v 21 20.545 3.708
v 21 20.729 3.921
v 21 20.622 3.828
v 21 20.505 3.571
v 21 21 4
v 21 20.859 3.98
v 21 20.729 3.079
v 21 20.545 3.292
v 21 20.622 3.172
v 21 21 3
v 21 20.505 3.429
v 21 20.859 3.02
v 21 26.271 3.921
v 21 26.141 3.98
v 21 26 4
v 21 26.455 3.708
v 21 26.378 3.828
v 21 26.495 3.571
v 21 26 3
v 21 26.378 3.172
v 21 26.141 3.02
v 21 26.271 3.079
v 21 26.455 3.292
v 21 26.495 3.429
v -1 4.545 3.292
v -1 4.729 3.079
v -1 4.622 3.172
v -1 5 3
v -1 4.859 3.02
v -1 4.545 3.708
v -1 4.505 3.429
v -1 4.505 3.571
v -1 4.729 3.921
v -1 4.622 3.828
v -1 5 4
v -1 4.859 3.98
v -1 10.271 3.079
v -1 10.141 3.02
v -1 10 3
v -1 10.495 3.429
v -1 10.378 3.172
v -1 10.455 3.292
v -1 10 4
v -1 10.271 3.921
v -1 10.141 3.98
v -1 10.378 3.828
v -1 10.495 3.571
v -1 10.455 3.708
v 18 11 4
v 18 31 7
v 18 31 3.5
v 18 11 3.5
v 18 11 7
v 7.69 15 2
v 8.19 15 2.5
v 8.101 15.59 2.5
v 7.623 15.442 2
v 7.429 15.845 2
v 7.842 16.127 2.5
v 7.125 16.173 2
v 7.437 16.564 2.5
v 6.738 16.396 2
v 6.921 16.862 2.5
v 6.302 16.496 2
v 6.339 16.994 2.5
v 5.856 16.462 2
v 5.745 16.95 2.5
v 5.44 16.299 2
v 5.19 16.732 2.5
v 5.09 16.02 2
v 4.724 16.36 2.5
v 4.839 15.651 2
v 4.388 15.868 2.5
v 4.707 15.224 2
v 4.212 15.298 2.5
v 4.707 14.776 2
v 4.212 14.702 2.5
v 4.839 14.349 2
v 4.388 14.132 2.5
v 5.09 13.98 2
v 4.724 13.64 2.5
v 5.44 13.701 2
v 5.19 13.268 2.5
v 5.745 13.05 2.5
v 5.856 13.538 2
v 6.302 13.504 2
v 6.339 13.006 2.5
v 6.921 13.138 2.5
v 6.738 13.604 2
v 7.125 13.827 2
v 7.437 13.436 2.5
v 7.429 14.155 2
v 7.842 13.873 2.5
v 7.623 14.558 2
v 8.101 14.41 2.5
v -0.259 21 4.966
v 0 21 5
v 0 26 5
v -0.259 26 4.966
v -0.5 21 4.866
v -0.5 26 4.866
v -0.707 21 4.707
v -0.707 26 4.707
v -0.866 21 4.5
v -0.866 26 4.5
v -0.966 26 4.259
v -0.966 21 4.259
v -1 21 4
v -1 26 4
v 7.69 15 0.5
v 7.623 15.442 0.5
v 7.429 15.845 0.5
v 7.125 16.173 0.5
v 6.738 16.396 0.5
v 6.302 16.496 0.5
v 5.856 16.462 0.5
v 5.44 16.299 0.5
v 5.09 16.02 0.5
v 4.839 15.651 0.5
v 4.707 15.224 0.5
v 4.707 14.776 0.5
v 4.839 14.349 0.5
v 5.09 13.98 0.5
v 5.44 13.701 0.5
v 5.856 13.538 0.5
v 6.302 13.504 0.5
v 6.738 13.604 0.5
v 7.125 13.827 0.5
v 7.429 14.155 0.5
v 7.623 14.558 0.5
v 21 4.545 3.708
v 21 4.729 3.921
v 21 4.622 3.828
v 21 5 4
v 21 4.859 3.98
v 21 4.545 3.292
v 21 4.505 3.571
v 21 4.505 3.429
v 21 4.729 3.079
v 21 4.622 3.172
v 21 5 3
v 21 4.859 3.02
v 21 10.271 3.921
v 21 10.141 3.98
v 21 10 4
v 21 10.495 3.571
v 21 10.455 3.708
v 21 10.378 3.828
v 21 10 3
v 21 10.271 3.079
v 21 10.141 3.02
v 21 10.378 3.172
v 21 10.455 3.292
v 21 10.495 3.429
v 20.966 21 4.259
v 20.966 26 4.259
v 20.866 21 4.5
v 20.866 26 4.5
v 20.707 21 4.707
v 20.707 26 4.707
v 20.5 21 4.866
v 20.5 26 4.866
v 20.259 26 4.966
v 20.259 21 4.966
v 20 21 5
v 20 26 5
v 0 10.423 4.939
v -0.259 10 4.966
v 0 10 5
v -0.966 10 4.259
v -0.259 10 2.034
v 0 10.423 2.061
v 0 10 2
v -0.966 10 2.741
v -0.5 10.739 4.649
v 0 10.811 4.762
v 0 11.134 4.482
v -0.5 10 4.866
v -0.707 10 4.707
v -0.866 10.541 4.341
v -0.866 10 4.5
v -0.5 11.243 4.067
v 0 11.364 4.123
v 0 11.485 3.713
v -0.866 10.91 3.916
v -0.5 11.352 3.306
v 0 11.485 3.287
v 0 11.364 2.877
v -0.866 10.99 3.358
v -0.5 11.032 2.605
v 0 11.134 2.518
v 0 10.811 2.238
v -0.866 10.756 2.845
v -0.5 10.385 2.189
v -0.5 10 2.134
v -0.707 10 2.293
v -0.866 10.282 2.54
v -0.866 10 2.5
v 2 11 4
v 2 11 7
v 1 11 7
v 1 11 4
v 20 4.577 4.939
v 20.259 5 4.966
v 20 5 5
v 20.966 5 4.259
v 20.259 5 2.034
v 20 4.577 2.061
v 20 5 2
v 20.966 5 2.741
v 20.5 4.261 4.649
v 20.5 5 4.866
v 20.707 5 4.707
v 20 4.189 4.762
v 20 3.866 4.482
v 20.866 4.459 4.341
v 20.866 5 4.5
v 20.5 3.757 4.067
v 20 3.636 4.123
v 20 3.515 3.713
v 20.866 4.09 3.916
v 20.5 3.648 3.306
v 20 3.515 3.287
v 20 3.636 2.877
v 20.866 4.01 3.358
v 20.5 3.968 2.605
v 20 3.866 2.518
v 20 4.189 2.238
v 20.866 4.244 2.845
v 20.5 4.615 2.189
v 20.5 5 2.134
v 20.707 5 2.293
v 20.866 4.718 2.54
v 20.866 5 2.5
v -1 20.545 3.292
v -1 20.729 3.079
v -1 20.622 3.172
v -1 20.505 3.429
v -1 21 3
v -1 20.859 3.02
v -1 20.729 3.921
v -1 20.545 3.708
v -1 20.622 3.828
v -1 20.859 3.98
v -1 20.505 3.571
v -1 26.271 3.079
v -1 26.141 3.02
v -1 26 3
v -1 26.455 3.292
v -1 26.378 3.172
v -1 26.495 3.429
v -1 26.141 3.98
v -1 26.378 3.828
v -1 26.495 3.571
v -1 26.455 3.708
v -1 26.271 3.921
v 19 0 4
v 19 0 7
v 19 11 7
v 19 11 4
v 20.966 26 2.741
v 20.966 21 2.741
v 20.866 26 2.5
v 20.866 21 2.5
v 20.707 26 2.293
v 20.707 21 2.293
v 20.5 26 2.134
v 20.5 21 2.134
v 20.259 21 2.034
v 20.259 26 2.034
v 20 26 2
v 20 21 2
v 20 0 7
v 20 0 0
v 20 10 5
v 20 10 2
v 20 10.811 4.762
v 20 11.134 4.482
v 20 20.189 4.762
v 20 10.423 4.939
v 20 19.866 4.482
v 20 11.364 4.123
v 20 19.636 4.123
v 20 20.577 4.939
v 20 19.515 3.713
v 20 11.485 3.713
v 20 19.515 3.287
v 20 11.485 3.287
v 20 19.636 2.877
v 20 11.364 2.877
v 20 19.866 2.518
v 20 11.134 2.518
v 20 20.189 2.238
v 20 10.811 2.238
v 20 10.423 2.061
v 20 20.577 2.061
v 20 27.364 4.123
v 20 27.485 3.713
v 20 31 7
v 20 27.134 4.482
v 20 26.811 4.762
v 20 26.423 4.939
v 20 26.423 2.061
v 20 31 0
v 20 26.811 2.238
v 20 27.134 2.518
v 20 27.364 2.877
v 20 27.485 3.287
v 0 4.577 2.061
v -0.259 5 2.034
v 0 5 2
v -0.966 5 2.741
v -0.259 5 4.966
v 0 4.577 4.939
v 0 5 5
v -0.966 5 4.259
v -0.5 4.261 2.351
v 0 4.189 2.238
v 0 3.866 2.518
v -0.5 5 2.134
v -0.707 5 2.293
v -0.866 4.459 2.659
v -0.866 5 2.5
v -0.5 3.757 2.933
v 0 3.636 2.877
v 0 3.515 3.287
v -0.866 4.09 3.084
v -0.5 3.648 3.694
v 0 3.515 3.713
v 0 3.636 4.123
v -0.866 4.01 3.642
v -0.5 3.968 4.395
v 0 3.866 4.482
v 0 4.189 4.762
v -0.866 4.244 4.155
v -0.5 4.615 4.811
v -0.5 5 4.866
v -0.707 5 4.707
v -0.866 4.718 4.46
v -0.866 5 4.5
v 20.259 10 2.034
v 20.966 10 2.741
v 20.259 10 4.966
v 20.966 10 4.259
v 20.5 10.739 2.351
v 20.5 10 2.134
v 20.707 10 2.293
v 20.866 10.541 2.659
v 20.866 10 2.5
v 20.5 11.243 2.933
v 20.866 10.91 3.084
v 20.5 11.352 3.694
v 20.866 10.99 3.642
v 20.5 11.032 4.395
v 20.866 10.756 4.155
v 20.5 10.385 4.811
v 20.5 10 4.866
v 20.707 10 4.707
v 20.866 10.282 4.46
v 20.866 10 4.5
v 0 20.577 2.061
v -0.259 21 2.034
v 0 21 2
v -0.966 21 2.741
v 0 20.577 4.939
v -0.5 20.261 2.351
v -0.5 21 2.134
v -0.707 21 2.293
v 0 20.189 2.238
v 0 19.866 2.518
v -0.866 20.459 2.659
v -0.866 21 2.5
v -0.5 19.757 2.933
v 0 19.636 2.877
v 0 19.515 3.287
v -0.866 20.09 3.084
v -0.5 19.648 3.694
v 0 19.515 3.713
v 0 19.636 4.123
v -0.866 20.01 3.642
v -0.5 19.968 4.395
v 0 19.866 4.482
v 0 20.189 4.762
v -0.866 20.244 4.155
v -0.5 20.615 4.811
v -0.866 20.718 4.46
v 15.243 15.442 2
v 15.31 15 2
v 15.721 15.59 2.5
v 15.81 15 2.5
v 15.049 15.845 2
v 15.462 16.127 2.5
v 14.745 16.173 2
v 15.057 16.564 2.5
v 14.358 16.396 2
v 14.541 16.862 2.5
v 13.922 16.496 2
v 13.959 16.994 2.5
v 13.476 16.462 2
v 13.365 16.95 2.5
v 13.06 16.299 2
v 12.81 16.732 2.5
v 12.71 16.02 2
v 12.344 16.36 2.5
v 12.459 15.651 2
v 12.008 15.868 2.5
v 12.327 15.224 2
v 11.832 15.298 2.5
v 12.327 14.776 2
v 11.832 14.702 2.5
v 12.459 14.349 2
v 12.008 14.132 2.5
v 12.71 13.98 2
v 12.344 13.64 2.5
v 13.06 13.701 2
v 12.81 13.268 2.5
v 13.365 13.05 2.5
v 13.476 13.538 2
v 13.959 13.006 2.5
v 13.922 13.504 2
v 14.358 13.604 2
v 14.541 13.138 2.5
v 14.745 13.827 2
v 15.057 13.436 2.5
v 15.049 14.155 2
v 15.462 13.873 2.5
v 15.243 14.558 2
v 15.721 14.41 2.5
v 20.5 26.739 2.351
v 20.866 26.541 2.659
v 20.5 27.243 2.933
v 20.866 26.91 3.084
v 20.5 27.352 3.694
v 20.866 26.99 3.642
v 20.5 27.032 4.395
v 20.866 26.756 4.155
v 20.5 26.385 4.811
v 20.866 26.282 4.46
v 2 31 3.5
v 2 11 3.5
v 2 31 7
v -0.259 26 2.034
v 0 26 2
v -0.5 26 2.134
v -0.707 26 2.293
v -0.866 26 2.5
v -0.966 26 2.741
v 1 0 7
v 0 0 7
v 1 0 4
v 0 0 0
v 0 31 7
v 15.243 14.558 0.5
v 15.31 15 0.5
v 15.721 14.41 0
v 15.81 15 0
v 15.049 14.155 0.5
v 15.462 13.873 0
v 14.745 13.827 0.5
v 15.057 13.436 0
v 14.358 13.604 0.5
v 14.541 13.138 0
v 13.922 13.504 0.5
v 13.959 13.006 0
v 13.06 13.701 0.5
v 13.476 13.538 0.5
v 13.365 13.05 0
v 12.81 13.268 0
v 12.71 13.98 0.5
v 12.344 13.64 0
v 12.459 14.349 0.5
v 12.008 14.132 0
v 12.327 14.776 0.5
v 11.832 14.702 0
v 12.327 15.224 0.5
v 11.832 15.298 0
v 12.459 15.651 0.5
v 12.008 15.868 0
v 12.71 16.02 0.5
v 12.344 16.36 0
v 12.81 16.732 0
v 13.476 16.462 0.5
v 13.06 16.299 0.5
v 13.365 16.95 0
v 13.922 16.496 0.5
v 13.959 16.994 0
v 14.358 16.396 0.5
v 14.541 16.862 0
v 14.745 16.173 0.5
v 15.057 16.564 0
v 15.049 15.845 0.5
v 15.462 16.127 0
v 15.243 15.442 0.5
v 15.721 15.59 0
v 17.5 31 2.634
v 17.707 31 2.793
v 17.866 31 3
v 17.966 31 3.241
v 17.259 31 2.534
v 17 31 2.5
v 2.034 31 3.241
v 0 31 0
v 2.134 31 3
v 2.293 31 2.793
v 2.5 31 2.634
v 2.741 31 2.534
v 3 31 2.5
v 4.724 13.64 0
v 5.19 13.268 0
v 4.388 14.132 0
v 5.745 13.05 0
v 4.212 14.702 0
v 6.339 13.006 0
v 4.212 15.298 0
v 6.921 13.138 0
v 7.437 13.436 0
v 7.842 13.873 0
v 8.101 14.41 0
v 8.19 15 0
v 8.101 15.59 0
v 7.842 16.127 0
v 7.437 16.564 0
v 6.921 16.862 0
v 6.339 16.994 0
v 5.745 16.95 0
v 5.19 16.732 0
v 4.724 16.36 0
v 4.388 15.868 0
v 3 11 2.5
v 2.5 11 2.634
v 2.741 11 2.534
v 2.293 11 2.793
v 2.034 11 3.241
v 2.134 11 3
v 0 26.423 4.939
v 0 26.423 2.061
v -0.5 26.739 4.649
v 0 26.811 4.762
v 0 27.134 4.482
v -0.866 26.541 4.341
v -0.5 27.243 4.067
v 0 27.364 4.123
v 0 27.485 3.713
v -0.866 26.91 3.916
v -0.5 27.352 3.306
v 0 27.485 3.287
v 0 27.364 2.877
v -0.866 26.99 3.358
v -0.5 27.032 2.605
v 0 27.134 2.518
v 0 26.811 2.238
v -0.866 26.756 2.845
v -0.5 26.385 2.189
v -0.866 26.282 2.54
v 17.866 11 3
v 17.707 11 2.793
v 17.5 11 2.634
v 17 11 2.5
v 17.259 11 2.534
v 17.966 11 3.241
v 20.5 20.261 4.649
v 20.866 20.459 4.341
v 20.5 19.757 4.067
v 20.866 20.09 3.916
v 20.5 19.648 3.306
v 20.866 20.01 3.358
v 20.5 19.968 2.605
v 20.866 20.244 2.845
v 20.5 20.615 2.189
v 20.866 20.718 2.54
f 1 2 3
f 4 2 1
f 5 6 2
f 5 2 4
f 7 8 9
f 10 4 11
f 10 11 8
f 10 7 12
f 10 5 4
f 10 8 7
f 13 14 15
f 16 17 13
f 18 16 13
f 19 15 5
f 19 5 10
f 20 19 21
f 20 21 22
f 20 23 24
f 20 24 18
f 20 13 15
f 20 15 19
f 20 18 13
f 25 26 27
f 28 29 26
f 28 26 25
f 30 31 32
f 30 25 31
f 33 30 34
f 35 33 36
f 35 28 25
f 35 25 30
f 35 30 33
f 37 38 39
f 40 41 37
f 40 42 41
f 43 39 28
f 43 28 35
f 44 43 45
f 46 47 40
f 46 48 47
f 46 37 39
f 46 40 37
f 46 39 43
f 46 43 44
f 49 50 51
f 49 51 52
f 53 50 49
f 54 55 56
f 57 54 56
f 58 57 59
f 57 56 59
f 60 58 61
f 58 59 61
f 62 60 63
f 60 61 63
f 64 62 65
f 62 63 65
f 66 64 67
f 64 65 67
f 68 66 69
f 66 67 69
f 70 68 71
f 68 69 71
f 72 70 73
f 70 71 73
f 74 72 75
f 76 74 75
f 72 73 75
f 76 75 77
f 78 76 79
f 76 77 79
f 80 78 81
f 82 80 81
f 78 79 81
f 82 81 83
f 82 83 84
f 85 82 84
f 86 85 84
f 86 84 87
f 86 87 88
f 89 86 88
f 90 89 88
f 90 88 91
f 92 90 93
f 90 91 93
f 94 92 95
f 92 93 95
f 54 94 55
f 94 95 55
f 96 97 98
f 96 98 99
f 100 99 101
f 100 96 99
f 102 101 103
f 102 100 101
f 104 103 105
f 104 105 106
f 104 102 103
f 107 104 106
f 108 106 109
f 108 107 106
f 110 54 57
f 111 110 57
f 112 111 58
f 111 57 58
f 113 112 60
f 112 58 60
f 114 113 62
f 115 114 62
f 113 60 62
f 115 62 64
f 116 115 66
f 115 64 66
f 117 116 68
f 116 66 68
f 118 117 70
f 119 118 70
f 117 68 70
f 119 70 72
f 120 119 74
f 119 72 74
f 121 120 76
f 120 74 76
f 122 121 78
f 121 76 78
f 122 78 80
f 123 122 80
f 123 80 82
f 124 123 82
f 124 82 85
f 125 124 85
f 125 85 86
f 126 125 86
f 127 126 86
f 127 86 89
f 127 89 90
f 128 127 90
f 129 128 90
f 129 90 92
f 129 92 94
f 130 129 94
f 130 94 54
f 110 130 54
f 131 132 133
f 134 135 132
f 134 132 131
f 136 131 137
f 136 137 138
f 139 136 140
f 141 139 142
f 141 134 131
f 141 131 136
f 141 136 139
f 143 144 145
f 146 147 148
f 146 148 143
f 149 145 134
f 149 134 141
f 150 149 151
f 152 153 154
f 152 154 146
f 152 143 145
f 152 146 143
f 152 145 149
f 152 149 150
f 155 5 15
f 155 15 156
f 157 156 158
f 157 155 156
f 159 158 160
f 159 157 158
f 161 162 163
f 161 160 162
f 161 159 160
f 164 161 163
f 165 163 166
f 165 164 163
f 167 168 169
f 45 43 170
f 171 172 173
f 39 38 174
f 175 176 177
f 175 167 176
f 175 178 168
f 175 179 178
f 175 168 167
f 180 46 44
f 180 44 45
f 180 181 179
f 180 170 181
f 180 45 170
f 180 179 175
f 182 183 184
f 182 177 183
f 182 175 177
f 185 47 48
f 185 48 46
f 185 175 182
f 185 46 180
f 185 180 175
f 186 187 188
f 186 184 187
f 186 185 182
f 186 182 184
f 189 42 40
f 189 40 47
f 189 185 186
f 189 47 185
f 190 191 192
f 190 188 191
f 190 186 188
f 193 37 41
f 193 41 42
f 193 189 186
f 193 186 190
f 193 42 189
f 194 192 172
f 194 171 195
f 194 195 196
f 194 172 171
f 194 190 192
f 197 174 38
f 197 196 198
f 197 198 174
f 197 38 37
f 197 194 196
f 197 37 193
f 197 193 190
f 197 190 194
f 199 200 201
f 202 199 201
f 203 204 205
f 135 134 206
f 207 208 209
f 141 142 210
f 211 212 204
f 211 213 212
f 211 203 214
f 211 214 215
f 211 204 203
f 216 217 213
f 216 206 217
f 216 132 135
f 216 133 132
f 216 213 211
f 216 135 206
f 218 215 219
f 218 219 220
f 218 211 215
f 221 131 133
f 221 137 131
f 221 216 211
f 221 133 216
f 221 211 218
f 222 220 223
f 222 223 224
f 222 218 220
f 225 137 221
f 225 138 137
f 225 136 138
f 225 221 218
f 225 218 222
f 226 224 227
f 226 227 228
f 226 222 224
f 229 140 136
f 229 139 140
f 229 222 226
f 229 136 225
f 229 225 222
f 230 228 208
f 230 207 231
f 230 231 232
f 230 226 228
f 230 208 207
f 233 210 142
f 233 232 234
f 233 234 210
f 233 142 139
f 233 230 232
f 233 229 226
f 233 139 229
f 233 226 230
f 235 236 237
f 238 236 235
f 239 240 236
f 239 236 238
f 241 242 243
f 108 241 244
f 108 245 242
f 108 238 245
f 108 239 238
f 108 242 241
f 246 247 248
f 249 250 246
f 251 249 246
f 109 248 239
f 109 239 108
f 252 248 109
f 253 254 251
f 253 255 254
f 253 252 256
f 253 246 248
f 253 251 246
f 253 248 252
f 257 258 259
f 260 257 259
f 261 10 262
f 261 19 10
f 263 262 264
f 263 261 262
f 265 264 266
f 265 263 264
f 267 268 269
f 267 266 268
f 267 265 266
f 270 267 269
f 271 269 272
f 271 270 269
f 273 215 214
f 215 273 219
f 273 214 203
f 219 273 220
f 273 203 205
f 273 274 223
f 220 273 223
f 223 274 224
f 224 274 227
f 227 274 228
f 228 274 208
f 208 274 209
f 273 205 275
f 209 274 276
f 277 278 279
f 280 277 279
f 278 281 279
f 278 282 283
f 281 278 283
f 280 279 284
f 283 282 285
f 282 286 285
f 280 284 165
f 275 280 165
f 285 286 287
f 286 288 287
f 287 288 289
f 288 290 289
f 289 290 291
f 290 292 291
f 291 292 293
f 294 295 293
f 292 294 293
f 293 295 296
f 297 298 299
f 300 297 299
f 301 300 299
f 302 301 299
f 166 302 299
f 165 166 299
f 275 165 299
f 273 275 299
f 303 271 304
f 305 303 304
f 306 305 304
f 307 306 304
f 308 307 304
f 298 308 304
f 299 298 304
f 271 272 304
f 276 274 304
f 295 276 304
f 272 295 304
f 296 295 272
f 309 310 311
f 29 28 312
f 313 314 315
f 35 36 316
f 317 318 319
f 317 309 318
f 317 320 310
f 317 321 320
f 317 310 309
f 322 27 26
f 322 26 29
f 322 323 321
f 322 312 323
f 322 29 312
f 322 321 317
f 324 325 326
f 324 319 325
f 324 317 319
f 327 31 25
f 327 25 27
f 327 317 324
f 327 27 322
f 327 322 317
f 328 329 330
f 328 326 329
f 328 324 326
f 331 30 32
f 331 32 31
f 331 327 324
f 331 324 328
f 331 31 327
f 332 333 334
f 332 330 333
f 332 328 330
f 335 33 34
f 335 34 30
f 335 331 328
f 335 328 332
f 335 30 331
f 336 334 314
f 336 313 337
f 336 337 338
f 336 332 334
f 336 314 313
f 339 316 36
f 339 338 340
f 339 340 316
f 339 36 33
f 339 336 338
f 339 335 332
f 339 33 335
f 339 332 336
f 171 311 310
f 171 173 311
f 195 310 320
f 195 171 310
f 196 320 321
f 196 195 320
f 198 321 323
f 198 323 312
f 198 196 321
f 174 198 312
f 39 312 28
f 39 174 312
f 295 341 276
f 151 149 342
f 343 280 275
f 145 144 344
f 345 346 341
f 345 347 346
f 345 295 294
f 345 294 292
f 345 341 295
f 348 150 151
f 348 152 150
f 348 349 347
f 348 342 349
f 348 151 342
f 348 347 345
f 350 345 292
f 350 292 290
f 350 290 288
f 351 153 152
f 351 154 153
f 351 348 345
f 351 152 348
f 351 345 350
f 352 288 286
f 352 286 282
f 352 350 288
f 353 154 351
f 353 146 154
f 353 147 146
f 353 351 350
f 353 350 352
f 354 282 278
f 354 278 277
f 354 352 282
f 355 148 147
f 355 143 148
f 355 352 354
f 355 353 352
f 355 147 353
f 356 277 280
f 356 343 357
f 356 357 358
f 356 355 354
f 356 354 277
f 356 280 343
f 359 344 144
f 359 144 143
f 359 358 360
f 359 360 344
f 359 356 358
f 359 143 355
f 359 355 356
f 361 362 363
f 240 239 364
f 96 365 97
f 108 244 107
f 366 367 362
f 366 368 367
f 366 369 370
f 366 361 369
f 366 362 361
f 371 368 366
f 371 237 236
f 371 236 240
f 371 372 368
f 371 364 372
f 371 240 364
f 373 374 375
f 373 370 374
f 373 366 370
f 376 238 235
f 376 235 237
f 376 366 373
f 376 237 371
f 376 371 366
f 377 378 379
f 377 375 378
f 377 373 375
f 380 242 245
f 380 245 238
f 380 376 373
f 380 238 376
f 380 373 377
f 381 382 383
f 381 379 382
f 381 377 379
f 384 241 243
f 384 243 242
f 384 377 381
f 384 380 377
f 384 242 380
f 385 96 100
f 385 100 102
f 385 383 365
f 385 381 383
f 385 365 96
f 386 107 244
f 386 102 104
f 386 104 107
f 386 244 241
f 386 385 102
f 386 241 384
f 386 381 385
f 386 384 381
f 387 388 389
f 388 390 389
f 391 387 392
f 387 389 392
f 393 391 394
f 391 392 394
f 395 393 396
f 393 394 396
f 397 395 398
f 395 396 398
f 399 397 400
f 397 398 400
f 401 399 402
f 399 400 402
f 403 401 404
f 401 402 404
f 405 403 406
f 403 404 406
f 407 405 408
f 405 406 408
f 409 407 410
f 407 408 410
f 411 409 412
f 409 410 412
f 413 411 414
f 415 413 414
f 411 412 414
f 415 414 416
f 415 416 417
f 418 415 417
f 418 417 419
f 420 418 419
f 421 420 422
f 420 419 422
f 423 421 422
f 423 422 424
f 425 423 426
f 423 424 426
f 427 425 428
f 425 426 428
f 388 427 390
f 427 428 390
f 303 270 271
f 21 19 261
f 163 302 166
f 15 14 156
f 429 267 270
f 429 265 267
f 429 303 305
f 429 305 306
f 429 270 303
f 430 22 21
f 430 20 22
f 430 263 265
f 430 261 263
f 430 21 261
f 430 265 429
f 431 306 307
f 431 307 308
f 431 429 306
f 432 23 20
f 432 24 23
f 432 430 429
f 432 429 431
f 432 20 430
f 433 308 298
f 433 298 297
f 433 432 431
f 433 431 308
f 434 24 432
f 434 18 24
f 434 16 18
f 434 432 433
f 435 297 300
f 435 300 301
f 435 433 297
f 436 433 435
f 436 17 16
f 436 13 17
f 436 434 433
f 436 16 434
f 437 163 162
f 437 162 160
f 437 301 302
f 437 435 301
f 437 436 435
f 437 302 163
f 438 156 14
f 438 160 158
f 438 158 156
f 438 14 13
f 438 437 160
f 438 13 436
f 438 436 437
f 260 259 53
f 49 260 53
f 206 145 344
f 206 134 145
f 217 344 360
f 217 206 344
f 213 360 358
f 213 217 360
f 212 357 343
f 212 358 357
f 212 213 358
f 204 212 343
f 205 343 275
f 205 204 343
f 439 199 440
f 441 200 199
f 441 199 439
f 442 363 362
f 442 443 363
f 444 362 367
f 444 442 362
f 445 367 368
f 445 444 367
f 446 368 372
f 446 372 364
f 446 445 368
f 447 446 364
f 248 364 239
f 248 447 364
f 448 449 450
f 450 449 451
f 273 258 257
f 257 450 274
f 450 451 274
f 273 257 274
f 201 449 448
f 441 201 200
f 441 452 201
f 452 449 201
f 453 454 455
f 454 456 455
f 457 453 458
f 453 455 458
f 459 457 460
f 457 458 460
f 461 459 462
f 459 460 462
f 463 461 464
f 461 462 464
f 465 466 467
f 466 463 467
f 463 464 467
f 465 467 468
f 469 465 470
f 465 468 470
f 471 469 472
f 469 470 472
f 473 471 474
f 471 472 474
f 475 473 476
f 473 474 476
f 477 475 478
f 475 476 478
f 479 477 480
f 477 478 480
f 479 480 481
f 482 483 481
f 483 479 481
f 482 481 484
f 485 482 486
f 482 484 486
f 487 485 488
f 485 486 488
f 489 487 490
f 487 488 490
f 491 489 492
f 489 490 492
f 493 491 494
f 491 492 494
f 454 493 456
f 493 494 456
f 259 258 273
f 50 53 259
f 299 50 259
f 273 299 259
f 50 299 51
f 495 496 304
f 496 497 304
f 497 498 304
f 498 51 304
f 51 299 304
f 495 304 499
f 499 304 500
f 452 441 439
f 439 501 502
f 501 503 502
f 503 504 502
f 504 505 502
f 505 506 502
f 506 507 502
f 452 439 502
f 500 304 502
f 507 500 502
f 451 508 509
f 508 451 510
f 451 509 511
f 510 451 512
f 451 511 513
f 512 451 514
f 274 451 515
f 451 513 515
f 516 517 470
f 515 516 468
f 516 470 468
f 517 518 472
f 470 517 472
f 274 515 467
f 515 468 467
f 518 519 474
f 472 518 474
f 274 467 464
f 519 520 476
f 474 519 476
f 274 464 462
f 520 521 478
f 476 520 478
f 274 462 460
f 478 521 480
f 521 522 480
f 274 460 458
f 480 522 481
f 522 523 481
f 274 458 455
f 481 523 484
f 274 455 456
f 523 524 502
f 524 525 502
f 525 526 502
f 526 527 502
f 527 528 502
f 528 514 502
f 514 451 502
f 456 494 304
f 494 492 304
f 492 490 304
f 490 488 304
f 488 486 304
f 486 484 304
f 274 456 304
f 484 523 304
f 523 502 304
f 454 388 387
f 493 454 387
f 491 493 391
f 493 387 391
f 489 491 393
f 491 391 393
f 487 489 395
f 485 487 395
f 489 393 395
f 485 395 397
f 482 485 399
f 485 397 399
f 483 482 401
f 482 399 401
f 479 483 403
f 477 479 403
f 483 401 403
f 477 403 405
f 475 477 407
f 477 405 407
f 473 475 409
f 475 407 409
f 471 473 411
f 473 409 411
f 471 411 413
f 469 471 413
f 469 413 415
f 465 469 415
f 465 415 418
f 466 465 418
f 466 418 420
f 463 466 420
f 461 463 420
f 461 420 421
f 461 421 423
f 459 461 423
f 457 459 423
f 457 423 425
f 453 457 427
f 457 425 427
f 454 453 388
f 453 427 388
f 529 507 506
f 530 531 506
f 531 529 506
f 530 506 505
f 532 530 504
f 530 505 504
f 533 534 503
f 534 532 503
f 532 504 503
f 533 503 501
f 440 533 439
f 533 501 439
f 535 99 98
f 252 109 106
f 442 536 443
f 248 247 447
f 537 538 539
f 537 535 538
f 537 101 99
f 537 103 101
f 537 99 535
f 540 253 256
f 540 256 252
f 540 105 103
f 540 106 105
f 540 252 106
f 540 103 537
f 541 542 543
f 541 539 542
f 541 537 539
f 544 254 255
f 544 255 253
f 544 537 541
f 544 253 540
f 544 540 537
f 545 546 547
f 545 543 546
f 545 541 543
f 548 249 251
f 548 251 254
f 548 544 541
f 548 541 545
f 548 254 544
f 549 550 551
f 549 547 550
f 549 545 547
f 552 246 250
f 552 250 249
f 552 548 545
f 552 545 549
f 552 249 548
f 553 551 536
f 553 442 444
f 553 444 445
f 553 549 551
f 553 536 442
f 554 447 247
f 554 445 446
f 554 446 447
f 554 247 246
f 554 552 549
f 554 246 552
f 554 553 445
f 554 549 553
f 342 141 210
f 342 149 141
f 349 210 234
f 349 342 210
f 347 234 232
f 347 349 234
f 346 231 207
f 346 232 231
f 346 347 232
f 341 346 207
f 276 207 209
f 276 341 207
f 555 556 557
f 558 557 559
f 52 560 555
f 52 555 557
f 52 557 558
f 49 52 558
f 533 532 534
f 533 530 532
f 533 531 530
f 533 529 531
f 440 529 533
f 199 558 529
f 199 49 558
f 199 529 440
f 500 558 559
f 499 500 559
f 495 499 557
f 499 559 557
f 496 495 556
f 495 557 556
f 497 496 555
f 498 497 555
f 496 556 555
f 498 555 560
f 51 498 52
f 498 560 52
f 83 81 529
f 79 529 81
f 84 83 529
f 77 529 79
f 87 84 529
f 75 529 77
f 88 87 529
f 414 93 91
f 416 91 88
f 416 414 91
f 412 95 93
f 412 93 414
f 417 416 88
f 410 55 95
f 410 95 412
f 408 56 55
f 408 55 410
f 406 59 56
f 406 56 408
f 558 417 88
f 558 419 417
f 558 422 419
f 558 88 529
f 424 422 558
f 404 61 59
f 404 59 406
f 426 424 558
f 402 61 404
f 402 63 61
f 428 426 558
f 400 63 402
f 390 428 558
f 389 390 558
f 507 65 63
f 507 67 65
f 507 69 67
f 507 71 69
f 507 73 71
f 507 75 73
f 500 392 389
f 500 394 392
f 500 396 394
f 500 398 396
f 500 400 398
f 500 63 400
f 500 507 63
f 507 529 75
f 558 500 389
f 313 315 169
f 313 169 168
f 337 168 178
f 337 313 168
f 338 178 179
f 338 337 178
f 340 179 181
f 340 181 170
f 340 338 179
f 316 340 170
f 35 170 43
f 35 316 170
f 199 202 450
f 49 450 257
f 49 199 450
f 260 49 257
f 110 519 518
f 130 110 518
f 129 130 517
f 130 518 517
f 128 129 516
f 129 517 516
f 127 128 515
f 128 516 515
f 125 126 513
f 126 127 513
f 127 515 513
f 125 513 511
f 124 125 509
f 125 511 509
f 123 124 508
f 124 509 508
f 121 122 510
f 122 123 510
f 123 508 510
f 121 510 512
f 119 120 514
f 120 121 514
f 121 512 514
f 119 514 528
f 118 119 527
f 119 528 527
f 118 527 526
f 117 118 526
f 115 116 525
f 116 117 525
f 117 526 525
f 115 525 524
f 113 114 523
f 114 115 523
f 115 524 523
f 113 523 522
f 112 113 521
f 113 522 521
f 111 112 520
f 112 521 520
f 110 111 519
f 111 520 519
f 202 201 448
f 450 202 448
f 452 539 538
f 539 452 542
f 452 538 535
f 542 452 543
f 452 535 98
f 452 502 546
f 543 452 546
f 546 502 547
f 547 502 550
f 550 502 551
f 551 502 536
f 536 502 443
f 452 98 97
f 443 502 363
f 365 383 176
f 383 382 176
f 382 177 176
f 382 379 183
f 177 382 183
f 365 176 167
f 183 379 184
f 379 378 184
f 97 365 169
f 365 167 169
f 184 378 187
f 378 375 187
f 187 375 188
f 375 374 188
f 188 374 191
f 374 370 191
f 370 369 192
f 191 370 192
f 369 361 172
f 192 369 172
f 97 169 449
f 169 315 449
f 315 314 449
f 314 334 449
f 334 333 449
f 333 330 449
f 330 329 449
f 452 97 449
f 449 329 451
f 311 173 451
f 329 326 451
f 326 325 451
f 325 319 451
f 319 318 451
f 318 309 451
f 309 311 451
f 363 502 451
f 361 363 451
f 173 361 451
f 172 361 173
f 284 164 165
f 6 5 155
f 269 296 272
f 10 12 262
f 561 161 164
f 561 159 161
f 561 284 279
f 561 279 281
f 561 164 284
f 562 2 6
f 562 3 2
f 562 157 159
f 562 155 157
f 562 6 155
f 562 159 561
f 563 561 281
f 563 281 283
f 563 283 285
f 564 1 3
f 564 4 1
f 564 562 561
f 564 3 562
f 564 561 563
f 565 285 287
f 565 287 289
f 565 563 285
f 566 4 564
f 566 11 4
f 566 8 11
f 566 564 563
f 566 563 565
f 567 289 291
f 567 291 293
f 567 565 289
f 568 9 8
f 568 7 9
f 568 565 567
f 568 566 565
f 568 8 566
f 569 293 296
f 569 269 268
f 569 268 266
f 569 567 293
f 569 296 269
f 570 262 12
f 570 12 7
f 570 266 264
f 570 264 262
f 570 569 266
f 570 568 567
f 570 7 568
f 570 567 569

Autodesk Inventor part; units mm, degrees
ref_plane "YZ Plane" through (0, 0, 0) normal (1, 0, 0) x (0, 1, 0)
ref_plane "XZ Plane" through (0, 0, 0) normal (0, 1, 0) x (-1, 0, 0)
sketch "Sketch1" plane through (0, 0, 0) normal (0, 0, 1) x (1, 0, 0)
  line L0 (0, 0) -> (20, 0)
  line L1 (20, 0) -> (20, 31)
  line L2 (20, 31) -> (0, 31)
  line L3 (0, 31) -> (0, 0)
  dimension "d0" = 20
  dimension "d1" = 31
extrude "Extrusion1" add sketch "Sketch1" along normal blind 7
sketch "Sketch2" plane through (0, 0, 7) normal (0, 0, 1) x (1, 0, 0)
  line L0 (20, 31) -> (0, 31) projected
  line L1 (2, 31) -> (18, 31)
  line L2 (18, 31) -> (18, 11)
  line L3 (18, 11) -> (2, 11)
  line L4 (2, 11) -> (2, 31)
  line L5 (0, 31) -> (0, 0) projected
  line L6 (20, 0) -> (20, 31) projected
  dimension "d4" = 20
  dimension "d5" = 2
  dimension "d6" = 2
extrude "Extrusion2" cut sketch "Sketch2" against normal blind 4.5
sketch "Sketch3" plane through (0, 0, 7) normal (0, 0, 1) x (1, 0, 0)
  line L0 (18, 11) -> (2, 11) projected
  line L1 (1, 0) -> (19, 0)
  line L2 (19, 0) -> (19, 11)
  line L3 (19, 11) -> (1, 11)
  line L4 (1, 11) -> (1, 0)
  line L5 (0, 31) -> (0, 0) projected
  line L6 (20, 0) -> (20, 31) projected
  dimension "d9" = 1
  dimension "d10" = 1
extrude "Extrusion3" cut sketch "Sketch3" against normal blind 3
sketch "Sketch4" plane through (0, 0, 2.5) normal (0, 0, 1) x (1, 0, 0)
  circle A0 centre (6.19, 15) radius 1.5
  circle A1 centre (13.81, 15) radius 1.5
  line L0 (19, 0) -> (1, 0) projected
  line L1 (2, 31) -> (18, 31) projected
  line L2 (2, 11) -> (2, 31) construction
  line L3 (2, 31) -> (18, 31) construction
  line L4 (2, 11) -> (2, 31) construction
  line L5 (18, 11) -> (2, 11) construction
  line L6 (18, 31) -> (18, 11) construction
  line L7 (20, 31) -> (0, 31) construction
  line L8 (10, 31) -> (10, 11) construction
  line L9 (18, 11) -> (2, 11) construction
  line L10 (10, 31) -> (30, 31) construction
  point P0 (0, 0)
  point P1 (2, 21)
  dimension "d13" = 3
  dimension "d14" = 3
  dimension "d15" = 7.62
  dimension "d16" = 15
  dimension "d17" = 90
extrude "Extrusion4" cut sketch "Sketch4" against normal up to next
chamfer "Chamfer1" distance 0.5 angle 45 2 edges at (4.69, 15, 2.5) (12.31, 15, 2.5)
sketch "Sketch5" plane through (20, 0, 0) normal (1, 0, 0) x (0, 0, -1)
  line L0 (0, 0) -> (-7, 0) construction
  line L1 (-3.5, 0) -> (-3.5, 31) construction
  line L2 (-3.5, 0) -> (27.5, 0) construction
  line L3 (-3.5, 5) -> (-3.5, 10) construction
  line L4 (-2, 5) -> (-2, 10)
  line L5 (-5, 10) -> (-5, 5)
  arc A0 (-5, 5) -> (-2, 5) centre (-3.5, 5) ccw
  arc A1 (-2, 10) -> (-5, 10) centre (-3.5, 10) ccw
  line L6 (-3.5, 21) -> (-3.5, 26) construction
  line L7 (-2, 21) -> (-2, 26)
  line L8 (-5, 26) -> (-5, 21)
  arc A2 (-5, 21) -> (-2, 21) centre (-3.5, 21) ccw
  arc A3 (-2, 26) -> (-5, 26) centre (-3.5, 26) ccw
  line L9 (0, 31) -> (-7, 31) projected
  point P0 (-3.5, 7.5)
  point P1 (-3.5, 23.5)
  dimension "d23" = 31
  dimension "d24" = 90
  dimension "d25" = 3
  dimension "d26" = 3
  dimension "d27" = 5
  dimension "d28" = 5
  dimension "d29" = 5
  dimension "d30" = 5
extrude "Extrusion5" add sketch "Sketch5" along normal blind 1
ref_plane "Work Plane1" through (10, 0, 0) normal (1, 0, 0) x (0, 0, -1)
mirror "Mirror1" about plane through (10, 0, 0) normal (1, 0, 0) of "Extrusion5"
fillet "Fillet2" radius 1 16 edges at (21, 19.5, 3.5) (21, 23.5, 2) (21, 27.5, 3.5) (21, 23.5, 5) (21, 3.5, 3.5) (21, 7.5, 2) (21, 11.5, 3.5) (21, 7.5, 5) (-1, 19.5, 3.5) (-1, 23.5, 2) (-1, 27.5, 3.5) (-1, 23.5, 5) (-1, 3.5, 3.5) (-1, 7.5, 2) (-1, 11.5, 3.5) (-1, 7.5, 5)
fillet "Fillet3" radius 1 2 edges at (2, 21, 2.5) (18, 21, 2.5)
chamfer "Chamfer2" distance 0.5 angle 45 2 edges at (12.31, 15, 0) (4.69, 15, 0)
properties part number "Top"
